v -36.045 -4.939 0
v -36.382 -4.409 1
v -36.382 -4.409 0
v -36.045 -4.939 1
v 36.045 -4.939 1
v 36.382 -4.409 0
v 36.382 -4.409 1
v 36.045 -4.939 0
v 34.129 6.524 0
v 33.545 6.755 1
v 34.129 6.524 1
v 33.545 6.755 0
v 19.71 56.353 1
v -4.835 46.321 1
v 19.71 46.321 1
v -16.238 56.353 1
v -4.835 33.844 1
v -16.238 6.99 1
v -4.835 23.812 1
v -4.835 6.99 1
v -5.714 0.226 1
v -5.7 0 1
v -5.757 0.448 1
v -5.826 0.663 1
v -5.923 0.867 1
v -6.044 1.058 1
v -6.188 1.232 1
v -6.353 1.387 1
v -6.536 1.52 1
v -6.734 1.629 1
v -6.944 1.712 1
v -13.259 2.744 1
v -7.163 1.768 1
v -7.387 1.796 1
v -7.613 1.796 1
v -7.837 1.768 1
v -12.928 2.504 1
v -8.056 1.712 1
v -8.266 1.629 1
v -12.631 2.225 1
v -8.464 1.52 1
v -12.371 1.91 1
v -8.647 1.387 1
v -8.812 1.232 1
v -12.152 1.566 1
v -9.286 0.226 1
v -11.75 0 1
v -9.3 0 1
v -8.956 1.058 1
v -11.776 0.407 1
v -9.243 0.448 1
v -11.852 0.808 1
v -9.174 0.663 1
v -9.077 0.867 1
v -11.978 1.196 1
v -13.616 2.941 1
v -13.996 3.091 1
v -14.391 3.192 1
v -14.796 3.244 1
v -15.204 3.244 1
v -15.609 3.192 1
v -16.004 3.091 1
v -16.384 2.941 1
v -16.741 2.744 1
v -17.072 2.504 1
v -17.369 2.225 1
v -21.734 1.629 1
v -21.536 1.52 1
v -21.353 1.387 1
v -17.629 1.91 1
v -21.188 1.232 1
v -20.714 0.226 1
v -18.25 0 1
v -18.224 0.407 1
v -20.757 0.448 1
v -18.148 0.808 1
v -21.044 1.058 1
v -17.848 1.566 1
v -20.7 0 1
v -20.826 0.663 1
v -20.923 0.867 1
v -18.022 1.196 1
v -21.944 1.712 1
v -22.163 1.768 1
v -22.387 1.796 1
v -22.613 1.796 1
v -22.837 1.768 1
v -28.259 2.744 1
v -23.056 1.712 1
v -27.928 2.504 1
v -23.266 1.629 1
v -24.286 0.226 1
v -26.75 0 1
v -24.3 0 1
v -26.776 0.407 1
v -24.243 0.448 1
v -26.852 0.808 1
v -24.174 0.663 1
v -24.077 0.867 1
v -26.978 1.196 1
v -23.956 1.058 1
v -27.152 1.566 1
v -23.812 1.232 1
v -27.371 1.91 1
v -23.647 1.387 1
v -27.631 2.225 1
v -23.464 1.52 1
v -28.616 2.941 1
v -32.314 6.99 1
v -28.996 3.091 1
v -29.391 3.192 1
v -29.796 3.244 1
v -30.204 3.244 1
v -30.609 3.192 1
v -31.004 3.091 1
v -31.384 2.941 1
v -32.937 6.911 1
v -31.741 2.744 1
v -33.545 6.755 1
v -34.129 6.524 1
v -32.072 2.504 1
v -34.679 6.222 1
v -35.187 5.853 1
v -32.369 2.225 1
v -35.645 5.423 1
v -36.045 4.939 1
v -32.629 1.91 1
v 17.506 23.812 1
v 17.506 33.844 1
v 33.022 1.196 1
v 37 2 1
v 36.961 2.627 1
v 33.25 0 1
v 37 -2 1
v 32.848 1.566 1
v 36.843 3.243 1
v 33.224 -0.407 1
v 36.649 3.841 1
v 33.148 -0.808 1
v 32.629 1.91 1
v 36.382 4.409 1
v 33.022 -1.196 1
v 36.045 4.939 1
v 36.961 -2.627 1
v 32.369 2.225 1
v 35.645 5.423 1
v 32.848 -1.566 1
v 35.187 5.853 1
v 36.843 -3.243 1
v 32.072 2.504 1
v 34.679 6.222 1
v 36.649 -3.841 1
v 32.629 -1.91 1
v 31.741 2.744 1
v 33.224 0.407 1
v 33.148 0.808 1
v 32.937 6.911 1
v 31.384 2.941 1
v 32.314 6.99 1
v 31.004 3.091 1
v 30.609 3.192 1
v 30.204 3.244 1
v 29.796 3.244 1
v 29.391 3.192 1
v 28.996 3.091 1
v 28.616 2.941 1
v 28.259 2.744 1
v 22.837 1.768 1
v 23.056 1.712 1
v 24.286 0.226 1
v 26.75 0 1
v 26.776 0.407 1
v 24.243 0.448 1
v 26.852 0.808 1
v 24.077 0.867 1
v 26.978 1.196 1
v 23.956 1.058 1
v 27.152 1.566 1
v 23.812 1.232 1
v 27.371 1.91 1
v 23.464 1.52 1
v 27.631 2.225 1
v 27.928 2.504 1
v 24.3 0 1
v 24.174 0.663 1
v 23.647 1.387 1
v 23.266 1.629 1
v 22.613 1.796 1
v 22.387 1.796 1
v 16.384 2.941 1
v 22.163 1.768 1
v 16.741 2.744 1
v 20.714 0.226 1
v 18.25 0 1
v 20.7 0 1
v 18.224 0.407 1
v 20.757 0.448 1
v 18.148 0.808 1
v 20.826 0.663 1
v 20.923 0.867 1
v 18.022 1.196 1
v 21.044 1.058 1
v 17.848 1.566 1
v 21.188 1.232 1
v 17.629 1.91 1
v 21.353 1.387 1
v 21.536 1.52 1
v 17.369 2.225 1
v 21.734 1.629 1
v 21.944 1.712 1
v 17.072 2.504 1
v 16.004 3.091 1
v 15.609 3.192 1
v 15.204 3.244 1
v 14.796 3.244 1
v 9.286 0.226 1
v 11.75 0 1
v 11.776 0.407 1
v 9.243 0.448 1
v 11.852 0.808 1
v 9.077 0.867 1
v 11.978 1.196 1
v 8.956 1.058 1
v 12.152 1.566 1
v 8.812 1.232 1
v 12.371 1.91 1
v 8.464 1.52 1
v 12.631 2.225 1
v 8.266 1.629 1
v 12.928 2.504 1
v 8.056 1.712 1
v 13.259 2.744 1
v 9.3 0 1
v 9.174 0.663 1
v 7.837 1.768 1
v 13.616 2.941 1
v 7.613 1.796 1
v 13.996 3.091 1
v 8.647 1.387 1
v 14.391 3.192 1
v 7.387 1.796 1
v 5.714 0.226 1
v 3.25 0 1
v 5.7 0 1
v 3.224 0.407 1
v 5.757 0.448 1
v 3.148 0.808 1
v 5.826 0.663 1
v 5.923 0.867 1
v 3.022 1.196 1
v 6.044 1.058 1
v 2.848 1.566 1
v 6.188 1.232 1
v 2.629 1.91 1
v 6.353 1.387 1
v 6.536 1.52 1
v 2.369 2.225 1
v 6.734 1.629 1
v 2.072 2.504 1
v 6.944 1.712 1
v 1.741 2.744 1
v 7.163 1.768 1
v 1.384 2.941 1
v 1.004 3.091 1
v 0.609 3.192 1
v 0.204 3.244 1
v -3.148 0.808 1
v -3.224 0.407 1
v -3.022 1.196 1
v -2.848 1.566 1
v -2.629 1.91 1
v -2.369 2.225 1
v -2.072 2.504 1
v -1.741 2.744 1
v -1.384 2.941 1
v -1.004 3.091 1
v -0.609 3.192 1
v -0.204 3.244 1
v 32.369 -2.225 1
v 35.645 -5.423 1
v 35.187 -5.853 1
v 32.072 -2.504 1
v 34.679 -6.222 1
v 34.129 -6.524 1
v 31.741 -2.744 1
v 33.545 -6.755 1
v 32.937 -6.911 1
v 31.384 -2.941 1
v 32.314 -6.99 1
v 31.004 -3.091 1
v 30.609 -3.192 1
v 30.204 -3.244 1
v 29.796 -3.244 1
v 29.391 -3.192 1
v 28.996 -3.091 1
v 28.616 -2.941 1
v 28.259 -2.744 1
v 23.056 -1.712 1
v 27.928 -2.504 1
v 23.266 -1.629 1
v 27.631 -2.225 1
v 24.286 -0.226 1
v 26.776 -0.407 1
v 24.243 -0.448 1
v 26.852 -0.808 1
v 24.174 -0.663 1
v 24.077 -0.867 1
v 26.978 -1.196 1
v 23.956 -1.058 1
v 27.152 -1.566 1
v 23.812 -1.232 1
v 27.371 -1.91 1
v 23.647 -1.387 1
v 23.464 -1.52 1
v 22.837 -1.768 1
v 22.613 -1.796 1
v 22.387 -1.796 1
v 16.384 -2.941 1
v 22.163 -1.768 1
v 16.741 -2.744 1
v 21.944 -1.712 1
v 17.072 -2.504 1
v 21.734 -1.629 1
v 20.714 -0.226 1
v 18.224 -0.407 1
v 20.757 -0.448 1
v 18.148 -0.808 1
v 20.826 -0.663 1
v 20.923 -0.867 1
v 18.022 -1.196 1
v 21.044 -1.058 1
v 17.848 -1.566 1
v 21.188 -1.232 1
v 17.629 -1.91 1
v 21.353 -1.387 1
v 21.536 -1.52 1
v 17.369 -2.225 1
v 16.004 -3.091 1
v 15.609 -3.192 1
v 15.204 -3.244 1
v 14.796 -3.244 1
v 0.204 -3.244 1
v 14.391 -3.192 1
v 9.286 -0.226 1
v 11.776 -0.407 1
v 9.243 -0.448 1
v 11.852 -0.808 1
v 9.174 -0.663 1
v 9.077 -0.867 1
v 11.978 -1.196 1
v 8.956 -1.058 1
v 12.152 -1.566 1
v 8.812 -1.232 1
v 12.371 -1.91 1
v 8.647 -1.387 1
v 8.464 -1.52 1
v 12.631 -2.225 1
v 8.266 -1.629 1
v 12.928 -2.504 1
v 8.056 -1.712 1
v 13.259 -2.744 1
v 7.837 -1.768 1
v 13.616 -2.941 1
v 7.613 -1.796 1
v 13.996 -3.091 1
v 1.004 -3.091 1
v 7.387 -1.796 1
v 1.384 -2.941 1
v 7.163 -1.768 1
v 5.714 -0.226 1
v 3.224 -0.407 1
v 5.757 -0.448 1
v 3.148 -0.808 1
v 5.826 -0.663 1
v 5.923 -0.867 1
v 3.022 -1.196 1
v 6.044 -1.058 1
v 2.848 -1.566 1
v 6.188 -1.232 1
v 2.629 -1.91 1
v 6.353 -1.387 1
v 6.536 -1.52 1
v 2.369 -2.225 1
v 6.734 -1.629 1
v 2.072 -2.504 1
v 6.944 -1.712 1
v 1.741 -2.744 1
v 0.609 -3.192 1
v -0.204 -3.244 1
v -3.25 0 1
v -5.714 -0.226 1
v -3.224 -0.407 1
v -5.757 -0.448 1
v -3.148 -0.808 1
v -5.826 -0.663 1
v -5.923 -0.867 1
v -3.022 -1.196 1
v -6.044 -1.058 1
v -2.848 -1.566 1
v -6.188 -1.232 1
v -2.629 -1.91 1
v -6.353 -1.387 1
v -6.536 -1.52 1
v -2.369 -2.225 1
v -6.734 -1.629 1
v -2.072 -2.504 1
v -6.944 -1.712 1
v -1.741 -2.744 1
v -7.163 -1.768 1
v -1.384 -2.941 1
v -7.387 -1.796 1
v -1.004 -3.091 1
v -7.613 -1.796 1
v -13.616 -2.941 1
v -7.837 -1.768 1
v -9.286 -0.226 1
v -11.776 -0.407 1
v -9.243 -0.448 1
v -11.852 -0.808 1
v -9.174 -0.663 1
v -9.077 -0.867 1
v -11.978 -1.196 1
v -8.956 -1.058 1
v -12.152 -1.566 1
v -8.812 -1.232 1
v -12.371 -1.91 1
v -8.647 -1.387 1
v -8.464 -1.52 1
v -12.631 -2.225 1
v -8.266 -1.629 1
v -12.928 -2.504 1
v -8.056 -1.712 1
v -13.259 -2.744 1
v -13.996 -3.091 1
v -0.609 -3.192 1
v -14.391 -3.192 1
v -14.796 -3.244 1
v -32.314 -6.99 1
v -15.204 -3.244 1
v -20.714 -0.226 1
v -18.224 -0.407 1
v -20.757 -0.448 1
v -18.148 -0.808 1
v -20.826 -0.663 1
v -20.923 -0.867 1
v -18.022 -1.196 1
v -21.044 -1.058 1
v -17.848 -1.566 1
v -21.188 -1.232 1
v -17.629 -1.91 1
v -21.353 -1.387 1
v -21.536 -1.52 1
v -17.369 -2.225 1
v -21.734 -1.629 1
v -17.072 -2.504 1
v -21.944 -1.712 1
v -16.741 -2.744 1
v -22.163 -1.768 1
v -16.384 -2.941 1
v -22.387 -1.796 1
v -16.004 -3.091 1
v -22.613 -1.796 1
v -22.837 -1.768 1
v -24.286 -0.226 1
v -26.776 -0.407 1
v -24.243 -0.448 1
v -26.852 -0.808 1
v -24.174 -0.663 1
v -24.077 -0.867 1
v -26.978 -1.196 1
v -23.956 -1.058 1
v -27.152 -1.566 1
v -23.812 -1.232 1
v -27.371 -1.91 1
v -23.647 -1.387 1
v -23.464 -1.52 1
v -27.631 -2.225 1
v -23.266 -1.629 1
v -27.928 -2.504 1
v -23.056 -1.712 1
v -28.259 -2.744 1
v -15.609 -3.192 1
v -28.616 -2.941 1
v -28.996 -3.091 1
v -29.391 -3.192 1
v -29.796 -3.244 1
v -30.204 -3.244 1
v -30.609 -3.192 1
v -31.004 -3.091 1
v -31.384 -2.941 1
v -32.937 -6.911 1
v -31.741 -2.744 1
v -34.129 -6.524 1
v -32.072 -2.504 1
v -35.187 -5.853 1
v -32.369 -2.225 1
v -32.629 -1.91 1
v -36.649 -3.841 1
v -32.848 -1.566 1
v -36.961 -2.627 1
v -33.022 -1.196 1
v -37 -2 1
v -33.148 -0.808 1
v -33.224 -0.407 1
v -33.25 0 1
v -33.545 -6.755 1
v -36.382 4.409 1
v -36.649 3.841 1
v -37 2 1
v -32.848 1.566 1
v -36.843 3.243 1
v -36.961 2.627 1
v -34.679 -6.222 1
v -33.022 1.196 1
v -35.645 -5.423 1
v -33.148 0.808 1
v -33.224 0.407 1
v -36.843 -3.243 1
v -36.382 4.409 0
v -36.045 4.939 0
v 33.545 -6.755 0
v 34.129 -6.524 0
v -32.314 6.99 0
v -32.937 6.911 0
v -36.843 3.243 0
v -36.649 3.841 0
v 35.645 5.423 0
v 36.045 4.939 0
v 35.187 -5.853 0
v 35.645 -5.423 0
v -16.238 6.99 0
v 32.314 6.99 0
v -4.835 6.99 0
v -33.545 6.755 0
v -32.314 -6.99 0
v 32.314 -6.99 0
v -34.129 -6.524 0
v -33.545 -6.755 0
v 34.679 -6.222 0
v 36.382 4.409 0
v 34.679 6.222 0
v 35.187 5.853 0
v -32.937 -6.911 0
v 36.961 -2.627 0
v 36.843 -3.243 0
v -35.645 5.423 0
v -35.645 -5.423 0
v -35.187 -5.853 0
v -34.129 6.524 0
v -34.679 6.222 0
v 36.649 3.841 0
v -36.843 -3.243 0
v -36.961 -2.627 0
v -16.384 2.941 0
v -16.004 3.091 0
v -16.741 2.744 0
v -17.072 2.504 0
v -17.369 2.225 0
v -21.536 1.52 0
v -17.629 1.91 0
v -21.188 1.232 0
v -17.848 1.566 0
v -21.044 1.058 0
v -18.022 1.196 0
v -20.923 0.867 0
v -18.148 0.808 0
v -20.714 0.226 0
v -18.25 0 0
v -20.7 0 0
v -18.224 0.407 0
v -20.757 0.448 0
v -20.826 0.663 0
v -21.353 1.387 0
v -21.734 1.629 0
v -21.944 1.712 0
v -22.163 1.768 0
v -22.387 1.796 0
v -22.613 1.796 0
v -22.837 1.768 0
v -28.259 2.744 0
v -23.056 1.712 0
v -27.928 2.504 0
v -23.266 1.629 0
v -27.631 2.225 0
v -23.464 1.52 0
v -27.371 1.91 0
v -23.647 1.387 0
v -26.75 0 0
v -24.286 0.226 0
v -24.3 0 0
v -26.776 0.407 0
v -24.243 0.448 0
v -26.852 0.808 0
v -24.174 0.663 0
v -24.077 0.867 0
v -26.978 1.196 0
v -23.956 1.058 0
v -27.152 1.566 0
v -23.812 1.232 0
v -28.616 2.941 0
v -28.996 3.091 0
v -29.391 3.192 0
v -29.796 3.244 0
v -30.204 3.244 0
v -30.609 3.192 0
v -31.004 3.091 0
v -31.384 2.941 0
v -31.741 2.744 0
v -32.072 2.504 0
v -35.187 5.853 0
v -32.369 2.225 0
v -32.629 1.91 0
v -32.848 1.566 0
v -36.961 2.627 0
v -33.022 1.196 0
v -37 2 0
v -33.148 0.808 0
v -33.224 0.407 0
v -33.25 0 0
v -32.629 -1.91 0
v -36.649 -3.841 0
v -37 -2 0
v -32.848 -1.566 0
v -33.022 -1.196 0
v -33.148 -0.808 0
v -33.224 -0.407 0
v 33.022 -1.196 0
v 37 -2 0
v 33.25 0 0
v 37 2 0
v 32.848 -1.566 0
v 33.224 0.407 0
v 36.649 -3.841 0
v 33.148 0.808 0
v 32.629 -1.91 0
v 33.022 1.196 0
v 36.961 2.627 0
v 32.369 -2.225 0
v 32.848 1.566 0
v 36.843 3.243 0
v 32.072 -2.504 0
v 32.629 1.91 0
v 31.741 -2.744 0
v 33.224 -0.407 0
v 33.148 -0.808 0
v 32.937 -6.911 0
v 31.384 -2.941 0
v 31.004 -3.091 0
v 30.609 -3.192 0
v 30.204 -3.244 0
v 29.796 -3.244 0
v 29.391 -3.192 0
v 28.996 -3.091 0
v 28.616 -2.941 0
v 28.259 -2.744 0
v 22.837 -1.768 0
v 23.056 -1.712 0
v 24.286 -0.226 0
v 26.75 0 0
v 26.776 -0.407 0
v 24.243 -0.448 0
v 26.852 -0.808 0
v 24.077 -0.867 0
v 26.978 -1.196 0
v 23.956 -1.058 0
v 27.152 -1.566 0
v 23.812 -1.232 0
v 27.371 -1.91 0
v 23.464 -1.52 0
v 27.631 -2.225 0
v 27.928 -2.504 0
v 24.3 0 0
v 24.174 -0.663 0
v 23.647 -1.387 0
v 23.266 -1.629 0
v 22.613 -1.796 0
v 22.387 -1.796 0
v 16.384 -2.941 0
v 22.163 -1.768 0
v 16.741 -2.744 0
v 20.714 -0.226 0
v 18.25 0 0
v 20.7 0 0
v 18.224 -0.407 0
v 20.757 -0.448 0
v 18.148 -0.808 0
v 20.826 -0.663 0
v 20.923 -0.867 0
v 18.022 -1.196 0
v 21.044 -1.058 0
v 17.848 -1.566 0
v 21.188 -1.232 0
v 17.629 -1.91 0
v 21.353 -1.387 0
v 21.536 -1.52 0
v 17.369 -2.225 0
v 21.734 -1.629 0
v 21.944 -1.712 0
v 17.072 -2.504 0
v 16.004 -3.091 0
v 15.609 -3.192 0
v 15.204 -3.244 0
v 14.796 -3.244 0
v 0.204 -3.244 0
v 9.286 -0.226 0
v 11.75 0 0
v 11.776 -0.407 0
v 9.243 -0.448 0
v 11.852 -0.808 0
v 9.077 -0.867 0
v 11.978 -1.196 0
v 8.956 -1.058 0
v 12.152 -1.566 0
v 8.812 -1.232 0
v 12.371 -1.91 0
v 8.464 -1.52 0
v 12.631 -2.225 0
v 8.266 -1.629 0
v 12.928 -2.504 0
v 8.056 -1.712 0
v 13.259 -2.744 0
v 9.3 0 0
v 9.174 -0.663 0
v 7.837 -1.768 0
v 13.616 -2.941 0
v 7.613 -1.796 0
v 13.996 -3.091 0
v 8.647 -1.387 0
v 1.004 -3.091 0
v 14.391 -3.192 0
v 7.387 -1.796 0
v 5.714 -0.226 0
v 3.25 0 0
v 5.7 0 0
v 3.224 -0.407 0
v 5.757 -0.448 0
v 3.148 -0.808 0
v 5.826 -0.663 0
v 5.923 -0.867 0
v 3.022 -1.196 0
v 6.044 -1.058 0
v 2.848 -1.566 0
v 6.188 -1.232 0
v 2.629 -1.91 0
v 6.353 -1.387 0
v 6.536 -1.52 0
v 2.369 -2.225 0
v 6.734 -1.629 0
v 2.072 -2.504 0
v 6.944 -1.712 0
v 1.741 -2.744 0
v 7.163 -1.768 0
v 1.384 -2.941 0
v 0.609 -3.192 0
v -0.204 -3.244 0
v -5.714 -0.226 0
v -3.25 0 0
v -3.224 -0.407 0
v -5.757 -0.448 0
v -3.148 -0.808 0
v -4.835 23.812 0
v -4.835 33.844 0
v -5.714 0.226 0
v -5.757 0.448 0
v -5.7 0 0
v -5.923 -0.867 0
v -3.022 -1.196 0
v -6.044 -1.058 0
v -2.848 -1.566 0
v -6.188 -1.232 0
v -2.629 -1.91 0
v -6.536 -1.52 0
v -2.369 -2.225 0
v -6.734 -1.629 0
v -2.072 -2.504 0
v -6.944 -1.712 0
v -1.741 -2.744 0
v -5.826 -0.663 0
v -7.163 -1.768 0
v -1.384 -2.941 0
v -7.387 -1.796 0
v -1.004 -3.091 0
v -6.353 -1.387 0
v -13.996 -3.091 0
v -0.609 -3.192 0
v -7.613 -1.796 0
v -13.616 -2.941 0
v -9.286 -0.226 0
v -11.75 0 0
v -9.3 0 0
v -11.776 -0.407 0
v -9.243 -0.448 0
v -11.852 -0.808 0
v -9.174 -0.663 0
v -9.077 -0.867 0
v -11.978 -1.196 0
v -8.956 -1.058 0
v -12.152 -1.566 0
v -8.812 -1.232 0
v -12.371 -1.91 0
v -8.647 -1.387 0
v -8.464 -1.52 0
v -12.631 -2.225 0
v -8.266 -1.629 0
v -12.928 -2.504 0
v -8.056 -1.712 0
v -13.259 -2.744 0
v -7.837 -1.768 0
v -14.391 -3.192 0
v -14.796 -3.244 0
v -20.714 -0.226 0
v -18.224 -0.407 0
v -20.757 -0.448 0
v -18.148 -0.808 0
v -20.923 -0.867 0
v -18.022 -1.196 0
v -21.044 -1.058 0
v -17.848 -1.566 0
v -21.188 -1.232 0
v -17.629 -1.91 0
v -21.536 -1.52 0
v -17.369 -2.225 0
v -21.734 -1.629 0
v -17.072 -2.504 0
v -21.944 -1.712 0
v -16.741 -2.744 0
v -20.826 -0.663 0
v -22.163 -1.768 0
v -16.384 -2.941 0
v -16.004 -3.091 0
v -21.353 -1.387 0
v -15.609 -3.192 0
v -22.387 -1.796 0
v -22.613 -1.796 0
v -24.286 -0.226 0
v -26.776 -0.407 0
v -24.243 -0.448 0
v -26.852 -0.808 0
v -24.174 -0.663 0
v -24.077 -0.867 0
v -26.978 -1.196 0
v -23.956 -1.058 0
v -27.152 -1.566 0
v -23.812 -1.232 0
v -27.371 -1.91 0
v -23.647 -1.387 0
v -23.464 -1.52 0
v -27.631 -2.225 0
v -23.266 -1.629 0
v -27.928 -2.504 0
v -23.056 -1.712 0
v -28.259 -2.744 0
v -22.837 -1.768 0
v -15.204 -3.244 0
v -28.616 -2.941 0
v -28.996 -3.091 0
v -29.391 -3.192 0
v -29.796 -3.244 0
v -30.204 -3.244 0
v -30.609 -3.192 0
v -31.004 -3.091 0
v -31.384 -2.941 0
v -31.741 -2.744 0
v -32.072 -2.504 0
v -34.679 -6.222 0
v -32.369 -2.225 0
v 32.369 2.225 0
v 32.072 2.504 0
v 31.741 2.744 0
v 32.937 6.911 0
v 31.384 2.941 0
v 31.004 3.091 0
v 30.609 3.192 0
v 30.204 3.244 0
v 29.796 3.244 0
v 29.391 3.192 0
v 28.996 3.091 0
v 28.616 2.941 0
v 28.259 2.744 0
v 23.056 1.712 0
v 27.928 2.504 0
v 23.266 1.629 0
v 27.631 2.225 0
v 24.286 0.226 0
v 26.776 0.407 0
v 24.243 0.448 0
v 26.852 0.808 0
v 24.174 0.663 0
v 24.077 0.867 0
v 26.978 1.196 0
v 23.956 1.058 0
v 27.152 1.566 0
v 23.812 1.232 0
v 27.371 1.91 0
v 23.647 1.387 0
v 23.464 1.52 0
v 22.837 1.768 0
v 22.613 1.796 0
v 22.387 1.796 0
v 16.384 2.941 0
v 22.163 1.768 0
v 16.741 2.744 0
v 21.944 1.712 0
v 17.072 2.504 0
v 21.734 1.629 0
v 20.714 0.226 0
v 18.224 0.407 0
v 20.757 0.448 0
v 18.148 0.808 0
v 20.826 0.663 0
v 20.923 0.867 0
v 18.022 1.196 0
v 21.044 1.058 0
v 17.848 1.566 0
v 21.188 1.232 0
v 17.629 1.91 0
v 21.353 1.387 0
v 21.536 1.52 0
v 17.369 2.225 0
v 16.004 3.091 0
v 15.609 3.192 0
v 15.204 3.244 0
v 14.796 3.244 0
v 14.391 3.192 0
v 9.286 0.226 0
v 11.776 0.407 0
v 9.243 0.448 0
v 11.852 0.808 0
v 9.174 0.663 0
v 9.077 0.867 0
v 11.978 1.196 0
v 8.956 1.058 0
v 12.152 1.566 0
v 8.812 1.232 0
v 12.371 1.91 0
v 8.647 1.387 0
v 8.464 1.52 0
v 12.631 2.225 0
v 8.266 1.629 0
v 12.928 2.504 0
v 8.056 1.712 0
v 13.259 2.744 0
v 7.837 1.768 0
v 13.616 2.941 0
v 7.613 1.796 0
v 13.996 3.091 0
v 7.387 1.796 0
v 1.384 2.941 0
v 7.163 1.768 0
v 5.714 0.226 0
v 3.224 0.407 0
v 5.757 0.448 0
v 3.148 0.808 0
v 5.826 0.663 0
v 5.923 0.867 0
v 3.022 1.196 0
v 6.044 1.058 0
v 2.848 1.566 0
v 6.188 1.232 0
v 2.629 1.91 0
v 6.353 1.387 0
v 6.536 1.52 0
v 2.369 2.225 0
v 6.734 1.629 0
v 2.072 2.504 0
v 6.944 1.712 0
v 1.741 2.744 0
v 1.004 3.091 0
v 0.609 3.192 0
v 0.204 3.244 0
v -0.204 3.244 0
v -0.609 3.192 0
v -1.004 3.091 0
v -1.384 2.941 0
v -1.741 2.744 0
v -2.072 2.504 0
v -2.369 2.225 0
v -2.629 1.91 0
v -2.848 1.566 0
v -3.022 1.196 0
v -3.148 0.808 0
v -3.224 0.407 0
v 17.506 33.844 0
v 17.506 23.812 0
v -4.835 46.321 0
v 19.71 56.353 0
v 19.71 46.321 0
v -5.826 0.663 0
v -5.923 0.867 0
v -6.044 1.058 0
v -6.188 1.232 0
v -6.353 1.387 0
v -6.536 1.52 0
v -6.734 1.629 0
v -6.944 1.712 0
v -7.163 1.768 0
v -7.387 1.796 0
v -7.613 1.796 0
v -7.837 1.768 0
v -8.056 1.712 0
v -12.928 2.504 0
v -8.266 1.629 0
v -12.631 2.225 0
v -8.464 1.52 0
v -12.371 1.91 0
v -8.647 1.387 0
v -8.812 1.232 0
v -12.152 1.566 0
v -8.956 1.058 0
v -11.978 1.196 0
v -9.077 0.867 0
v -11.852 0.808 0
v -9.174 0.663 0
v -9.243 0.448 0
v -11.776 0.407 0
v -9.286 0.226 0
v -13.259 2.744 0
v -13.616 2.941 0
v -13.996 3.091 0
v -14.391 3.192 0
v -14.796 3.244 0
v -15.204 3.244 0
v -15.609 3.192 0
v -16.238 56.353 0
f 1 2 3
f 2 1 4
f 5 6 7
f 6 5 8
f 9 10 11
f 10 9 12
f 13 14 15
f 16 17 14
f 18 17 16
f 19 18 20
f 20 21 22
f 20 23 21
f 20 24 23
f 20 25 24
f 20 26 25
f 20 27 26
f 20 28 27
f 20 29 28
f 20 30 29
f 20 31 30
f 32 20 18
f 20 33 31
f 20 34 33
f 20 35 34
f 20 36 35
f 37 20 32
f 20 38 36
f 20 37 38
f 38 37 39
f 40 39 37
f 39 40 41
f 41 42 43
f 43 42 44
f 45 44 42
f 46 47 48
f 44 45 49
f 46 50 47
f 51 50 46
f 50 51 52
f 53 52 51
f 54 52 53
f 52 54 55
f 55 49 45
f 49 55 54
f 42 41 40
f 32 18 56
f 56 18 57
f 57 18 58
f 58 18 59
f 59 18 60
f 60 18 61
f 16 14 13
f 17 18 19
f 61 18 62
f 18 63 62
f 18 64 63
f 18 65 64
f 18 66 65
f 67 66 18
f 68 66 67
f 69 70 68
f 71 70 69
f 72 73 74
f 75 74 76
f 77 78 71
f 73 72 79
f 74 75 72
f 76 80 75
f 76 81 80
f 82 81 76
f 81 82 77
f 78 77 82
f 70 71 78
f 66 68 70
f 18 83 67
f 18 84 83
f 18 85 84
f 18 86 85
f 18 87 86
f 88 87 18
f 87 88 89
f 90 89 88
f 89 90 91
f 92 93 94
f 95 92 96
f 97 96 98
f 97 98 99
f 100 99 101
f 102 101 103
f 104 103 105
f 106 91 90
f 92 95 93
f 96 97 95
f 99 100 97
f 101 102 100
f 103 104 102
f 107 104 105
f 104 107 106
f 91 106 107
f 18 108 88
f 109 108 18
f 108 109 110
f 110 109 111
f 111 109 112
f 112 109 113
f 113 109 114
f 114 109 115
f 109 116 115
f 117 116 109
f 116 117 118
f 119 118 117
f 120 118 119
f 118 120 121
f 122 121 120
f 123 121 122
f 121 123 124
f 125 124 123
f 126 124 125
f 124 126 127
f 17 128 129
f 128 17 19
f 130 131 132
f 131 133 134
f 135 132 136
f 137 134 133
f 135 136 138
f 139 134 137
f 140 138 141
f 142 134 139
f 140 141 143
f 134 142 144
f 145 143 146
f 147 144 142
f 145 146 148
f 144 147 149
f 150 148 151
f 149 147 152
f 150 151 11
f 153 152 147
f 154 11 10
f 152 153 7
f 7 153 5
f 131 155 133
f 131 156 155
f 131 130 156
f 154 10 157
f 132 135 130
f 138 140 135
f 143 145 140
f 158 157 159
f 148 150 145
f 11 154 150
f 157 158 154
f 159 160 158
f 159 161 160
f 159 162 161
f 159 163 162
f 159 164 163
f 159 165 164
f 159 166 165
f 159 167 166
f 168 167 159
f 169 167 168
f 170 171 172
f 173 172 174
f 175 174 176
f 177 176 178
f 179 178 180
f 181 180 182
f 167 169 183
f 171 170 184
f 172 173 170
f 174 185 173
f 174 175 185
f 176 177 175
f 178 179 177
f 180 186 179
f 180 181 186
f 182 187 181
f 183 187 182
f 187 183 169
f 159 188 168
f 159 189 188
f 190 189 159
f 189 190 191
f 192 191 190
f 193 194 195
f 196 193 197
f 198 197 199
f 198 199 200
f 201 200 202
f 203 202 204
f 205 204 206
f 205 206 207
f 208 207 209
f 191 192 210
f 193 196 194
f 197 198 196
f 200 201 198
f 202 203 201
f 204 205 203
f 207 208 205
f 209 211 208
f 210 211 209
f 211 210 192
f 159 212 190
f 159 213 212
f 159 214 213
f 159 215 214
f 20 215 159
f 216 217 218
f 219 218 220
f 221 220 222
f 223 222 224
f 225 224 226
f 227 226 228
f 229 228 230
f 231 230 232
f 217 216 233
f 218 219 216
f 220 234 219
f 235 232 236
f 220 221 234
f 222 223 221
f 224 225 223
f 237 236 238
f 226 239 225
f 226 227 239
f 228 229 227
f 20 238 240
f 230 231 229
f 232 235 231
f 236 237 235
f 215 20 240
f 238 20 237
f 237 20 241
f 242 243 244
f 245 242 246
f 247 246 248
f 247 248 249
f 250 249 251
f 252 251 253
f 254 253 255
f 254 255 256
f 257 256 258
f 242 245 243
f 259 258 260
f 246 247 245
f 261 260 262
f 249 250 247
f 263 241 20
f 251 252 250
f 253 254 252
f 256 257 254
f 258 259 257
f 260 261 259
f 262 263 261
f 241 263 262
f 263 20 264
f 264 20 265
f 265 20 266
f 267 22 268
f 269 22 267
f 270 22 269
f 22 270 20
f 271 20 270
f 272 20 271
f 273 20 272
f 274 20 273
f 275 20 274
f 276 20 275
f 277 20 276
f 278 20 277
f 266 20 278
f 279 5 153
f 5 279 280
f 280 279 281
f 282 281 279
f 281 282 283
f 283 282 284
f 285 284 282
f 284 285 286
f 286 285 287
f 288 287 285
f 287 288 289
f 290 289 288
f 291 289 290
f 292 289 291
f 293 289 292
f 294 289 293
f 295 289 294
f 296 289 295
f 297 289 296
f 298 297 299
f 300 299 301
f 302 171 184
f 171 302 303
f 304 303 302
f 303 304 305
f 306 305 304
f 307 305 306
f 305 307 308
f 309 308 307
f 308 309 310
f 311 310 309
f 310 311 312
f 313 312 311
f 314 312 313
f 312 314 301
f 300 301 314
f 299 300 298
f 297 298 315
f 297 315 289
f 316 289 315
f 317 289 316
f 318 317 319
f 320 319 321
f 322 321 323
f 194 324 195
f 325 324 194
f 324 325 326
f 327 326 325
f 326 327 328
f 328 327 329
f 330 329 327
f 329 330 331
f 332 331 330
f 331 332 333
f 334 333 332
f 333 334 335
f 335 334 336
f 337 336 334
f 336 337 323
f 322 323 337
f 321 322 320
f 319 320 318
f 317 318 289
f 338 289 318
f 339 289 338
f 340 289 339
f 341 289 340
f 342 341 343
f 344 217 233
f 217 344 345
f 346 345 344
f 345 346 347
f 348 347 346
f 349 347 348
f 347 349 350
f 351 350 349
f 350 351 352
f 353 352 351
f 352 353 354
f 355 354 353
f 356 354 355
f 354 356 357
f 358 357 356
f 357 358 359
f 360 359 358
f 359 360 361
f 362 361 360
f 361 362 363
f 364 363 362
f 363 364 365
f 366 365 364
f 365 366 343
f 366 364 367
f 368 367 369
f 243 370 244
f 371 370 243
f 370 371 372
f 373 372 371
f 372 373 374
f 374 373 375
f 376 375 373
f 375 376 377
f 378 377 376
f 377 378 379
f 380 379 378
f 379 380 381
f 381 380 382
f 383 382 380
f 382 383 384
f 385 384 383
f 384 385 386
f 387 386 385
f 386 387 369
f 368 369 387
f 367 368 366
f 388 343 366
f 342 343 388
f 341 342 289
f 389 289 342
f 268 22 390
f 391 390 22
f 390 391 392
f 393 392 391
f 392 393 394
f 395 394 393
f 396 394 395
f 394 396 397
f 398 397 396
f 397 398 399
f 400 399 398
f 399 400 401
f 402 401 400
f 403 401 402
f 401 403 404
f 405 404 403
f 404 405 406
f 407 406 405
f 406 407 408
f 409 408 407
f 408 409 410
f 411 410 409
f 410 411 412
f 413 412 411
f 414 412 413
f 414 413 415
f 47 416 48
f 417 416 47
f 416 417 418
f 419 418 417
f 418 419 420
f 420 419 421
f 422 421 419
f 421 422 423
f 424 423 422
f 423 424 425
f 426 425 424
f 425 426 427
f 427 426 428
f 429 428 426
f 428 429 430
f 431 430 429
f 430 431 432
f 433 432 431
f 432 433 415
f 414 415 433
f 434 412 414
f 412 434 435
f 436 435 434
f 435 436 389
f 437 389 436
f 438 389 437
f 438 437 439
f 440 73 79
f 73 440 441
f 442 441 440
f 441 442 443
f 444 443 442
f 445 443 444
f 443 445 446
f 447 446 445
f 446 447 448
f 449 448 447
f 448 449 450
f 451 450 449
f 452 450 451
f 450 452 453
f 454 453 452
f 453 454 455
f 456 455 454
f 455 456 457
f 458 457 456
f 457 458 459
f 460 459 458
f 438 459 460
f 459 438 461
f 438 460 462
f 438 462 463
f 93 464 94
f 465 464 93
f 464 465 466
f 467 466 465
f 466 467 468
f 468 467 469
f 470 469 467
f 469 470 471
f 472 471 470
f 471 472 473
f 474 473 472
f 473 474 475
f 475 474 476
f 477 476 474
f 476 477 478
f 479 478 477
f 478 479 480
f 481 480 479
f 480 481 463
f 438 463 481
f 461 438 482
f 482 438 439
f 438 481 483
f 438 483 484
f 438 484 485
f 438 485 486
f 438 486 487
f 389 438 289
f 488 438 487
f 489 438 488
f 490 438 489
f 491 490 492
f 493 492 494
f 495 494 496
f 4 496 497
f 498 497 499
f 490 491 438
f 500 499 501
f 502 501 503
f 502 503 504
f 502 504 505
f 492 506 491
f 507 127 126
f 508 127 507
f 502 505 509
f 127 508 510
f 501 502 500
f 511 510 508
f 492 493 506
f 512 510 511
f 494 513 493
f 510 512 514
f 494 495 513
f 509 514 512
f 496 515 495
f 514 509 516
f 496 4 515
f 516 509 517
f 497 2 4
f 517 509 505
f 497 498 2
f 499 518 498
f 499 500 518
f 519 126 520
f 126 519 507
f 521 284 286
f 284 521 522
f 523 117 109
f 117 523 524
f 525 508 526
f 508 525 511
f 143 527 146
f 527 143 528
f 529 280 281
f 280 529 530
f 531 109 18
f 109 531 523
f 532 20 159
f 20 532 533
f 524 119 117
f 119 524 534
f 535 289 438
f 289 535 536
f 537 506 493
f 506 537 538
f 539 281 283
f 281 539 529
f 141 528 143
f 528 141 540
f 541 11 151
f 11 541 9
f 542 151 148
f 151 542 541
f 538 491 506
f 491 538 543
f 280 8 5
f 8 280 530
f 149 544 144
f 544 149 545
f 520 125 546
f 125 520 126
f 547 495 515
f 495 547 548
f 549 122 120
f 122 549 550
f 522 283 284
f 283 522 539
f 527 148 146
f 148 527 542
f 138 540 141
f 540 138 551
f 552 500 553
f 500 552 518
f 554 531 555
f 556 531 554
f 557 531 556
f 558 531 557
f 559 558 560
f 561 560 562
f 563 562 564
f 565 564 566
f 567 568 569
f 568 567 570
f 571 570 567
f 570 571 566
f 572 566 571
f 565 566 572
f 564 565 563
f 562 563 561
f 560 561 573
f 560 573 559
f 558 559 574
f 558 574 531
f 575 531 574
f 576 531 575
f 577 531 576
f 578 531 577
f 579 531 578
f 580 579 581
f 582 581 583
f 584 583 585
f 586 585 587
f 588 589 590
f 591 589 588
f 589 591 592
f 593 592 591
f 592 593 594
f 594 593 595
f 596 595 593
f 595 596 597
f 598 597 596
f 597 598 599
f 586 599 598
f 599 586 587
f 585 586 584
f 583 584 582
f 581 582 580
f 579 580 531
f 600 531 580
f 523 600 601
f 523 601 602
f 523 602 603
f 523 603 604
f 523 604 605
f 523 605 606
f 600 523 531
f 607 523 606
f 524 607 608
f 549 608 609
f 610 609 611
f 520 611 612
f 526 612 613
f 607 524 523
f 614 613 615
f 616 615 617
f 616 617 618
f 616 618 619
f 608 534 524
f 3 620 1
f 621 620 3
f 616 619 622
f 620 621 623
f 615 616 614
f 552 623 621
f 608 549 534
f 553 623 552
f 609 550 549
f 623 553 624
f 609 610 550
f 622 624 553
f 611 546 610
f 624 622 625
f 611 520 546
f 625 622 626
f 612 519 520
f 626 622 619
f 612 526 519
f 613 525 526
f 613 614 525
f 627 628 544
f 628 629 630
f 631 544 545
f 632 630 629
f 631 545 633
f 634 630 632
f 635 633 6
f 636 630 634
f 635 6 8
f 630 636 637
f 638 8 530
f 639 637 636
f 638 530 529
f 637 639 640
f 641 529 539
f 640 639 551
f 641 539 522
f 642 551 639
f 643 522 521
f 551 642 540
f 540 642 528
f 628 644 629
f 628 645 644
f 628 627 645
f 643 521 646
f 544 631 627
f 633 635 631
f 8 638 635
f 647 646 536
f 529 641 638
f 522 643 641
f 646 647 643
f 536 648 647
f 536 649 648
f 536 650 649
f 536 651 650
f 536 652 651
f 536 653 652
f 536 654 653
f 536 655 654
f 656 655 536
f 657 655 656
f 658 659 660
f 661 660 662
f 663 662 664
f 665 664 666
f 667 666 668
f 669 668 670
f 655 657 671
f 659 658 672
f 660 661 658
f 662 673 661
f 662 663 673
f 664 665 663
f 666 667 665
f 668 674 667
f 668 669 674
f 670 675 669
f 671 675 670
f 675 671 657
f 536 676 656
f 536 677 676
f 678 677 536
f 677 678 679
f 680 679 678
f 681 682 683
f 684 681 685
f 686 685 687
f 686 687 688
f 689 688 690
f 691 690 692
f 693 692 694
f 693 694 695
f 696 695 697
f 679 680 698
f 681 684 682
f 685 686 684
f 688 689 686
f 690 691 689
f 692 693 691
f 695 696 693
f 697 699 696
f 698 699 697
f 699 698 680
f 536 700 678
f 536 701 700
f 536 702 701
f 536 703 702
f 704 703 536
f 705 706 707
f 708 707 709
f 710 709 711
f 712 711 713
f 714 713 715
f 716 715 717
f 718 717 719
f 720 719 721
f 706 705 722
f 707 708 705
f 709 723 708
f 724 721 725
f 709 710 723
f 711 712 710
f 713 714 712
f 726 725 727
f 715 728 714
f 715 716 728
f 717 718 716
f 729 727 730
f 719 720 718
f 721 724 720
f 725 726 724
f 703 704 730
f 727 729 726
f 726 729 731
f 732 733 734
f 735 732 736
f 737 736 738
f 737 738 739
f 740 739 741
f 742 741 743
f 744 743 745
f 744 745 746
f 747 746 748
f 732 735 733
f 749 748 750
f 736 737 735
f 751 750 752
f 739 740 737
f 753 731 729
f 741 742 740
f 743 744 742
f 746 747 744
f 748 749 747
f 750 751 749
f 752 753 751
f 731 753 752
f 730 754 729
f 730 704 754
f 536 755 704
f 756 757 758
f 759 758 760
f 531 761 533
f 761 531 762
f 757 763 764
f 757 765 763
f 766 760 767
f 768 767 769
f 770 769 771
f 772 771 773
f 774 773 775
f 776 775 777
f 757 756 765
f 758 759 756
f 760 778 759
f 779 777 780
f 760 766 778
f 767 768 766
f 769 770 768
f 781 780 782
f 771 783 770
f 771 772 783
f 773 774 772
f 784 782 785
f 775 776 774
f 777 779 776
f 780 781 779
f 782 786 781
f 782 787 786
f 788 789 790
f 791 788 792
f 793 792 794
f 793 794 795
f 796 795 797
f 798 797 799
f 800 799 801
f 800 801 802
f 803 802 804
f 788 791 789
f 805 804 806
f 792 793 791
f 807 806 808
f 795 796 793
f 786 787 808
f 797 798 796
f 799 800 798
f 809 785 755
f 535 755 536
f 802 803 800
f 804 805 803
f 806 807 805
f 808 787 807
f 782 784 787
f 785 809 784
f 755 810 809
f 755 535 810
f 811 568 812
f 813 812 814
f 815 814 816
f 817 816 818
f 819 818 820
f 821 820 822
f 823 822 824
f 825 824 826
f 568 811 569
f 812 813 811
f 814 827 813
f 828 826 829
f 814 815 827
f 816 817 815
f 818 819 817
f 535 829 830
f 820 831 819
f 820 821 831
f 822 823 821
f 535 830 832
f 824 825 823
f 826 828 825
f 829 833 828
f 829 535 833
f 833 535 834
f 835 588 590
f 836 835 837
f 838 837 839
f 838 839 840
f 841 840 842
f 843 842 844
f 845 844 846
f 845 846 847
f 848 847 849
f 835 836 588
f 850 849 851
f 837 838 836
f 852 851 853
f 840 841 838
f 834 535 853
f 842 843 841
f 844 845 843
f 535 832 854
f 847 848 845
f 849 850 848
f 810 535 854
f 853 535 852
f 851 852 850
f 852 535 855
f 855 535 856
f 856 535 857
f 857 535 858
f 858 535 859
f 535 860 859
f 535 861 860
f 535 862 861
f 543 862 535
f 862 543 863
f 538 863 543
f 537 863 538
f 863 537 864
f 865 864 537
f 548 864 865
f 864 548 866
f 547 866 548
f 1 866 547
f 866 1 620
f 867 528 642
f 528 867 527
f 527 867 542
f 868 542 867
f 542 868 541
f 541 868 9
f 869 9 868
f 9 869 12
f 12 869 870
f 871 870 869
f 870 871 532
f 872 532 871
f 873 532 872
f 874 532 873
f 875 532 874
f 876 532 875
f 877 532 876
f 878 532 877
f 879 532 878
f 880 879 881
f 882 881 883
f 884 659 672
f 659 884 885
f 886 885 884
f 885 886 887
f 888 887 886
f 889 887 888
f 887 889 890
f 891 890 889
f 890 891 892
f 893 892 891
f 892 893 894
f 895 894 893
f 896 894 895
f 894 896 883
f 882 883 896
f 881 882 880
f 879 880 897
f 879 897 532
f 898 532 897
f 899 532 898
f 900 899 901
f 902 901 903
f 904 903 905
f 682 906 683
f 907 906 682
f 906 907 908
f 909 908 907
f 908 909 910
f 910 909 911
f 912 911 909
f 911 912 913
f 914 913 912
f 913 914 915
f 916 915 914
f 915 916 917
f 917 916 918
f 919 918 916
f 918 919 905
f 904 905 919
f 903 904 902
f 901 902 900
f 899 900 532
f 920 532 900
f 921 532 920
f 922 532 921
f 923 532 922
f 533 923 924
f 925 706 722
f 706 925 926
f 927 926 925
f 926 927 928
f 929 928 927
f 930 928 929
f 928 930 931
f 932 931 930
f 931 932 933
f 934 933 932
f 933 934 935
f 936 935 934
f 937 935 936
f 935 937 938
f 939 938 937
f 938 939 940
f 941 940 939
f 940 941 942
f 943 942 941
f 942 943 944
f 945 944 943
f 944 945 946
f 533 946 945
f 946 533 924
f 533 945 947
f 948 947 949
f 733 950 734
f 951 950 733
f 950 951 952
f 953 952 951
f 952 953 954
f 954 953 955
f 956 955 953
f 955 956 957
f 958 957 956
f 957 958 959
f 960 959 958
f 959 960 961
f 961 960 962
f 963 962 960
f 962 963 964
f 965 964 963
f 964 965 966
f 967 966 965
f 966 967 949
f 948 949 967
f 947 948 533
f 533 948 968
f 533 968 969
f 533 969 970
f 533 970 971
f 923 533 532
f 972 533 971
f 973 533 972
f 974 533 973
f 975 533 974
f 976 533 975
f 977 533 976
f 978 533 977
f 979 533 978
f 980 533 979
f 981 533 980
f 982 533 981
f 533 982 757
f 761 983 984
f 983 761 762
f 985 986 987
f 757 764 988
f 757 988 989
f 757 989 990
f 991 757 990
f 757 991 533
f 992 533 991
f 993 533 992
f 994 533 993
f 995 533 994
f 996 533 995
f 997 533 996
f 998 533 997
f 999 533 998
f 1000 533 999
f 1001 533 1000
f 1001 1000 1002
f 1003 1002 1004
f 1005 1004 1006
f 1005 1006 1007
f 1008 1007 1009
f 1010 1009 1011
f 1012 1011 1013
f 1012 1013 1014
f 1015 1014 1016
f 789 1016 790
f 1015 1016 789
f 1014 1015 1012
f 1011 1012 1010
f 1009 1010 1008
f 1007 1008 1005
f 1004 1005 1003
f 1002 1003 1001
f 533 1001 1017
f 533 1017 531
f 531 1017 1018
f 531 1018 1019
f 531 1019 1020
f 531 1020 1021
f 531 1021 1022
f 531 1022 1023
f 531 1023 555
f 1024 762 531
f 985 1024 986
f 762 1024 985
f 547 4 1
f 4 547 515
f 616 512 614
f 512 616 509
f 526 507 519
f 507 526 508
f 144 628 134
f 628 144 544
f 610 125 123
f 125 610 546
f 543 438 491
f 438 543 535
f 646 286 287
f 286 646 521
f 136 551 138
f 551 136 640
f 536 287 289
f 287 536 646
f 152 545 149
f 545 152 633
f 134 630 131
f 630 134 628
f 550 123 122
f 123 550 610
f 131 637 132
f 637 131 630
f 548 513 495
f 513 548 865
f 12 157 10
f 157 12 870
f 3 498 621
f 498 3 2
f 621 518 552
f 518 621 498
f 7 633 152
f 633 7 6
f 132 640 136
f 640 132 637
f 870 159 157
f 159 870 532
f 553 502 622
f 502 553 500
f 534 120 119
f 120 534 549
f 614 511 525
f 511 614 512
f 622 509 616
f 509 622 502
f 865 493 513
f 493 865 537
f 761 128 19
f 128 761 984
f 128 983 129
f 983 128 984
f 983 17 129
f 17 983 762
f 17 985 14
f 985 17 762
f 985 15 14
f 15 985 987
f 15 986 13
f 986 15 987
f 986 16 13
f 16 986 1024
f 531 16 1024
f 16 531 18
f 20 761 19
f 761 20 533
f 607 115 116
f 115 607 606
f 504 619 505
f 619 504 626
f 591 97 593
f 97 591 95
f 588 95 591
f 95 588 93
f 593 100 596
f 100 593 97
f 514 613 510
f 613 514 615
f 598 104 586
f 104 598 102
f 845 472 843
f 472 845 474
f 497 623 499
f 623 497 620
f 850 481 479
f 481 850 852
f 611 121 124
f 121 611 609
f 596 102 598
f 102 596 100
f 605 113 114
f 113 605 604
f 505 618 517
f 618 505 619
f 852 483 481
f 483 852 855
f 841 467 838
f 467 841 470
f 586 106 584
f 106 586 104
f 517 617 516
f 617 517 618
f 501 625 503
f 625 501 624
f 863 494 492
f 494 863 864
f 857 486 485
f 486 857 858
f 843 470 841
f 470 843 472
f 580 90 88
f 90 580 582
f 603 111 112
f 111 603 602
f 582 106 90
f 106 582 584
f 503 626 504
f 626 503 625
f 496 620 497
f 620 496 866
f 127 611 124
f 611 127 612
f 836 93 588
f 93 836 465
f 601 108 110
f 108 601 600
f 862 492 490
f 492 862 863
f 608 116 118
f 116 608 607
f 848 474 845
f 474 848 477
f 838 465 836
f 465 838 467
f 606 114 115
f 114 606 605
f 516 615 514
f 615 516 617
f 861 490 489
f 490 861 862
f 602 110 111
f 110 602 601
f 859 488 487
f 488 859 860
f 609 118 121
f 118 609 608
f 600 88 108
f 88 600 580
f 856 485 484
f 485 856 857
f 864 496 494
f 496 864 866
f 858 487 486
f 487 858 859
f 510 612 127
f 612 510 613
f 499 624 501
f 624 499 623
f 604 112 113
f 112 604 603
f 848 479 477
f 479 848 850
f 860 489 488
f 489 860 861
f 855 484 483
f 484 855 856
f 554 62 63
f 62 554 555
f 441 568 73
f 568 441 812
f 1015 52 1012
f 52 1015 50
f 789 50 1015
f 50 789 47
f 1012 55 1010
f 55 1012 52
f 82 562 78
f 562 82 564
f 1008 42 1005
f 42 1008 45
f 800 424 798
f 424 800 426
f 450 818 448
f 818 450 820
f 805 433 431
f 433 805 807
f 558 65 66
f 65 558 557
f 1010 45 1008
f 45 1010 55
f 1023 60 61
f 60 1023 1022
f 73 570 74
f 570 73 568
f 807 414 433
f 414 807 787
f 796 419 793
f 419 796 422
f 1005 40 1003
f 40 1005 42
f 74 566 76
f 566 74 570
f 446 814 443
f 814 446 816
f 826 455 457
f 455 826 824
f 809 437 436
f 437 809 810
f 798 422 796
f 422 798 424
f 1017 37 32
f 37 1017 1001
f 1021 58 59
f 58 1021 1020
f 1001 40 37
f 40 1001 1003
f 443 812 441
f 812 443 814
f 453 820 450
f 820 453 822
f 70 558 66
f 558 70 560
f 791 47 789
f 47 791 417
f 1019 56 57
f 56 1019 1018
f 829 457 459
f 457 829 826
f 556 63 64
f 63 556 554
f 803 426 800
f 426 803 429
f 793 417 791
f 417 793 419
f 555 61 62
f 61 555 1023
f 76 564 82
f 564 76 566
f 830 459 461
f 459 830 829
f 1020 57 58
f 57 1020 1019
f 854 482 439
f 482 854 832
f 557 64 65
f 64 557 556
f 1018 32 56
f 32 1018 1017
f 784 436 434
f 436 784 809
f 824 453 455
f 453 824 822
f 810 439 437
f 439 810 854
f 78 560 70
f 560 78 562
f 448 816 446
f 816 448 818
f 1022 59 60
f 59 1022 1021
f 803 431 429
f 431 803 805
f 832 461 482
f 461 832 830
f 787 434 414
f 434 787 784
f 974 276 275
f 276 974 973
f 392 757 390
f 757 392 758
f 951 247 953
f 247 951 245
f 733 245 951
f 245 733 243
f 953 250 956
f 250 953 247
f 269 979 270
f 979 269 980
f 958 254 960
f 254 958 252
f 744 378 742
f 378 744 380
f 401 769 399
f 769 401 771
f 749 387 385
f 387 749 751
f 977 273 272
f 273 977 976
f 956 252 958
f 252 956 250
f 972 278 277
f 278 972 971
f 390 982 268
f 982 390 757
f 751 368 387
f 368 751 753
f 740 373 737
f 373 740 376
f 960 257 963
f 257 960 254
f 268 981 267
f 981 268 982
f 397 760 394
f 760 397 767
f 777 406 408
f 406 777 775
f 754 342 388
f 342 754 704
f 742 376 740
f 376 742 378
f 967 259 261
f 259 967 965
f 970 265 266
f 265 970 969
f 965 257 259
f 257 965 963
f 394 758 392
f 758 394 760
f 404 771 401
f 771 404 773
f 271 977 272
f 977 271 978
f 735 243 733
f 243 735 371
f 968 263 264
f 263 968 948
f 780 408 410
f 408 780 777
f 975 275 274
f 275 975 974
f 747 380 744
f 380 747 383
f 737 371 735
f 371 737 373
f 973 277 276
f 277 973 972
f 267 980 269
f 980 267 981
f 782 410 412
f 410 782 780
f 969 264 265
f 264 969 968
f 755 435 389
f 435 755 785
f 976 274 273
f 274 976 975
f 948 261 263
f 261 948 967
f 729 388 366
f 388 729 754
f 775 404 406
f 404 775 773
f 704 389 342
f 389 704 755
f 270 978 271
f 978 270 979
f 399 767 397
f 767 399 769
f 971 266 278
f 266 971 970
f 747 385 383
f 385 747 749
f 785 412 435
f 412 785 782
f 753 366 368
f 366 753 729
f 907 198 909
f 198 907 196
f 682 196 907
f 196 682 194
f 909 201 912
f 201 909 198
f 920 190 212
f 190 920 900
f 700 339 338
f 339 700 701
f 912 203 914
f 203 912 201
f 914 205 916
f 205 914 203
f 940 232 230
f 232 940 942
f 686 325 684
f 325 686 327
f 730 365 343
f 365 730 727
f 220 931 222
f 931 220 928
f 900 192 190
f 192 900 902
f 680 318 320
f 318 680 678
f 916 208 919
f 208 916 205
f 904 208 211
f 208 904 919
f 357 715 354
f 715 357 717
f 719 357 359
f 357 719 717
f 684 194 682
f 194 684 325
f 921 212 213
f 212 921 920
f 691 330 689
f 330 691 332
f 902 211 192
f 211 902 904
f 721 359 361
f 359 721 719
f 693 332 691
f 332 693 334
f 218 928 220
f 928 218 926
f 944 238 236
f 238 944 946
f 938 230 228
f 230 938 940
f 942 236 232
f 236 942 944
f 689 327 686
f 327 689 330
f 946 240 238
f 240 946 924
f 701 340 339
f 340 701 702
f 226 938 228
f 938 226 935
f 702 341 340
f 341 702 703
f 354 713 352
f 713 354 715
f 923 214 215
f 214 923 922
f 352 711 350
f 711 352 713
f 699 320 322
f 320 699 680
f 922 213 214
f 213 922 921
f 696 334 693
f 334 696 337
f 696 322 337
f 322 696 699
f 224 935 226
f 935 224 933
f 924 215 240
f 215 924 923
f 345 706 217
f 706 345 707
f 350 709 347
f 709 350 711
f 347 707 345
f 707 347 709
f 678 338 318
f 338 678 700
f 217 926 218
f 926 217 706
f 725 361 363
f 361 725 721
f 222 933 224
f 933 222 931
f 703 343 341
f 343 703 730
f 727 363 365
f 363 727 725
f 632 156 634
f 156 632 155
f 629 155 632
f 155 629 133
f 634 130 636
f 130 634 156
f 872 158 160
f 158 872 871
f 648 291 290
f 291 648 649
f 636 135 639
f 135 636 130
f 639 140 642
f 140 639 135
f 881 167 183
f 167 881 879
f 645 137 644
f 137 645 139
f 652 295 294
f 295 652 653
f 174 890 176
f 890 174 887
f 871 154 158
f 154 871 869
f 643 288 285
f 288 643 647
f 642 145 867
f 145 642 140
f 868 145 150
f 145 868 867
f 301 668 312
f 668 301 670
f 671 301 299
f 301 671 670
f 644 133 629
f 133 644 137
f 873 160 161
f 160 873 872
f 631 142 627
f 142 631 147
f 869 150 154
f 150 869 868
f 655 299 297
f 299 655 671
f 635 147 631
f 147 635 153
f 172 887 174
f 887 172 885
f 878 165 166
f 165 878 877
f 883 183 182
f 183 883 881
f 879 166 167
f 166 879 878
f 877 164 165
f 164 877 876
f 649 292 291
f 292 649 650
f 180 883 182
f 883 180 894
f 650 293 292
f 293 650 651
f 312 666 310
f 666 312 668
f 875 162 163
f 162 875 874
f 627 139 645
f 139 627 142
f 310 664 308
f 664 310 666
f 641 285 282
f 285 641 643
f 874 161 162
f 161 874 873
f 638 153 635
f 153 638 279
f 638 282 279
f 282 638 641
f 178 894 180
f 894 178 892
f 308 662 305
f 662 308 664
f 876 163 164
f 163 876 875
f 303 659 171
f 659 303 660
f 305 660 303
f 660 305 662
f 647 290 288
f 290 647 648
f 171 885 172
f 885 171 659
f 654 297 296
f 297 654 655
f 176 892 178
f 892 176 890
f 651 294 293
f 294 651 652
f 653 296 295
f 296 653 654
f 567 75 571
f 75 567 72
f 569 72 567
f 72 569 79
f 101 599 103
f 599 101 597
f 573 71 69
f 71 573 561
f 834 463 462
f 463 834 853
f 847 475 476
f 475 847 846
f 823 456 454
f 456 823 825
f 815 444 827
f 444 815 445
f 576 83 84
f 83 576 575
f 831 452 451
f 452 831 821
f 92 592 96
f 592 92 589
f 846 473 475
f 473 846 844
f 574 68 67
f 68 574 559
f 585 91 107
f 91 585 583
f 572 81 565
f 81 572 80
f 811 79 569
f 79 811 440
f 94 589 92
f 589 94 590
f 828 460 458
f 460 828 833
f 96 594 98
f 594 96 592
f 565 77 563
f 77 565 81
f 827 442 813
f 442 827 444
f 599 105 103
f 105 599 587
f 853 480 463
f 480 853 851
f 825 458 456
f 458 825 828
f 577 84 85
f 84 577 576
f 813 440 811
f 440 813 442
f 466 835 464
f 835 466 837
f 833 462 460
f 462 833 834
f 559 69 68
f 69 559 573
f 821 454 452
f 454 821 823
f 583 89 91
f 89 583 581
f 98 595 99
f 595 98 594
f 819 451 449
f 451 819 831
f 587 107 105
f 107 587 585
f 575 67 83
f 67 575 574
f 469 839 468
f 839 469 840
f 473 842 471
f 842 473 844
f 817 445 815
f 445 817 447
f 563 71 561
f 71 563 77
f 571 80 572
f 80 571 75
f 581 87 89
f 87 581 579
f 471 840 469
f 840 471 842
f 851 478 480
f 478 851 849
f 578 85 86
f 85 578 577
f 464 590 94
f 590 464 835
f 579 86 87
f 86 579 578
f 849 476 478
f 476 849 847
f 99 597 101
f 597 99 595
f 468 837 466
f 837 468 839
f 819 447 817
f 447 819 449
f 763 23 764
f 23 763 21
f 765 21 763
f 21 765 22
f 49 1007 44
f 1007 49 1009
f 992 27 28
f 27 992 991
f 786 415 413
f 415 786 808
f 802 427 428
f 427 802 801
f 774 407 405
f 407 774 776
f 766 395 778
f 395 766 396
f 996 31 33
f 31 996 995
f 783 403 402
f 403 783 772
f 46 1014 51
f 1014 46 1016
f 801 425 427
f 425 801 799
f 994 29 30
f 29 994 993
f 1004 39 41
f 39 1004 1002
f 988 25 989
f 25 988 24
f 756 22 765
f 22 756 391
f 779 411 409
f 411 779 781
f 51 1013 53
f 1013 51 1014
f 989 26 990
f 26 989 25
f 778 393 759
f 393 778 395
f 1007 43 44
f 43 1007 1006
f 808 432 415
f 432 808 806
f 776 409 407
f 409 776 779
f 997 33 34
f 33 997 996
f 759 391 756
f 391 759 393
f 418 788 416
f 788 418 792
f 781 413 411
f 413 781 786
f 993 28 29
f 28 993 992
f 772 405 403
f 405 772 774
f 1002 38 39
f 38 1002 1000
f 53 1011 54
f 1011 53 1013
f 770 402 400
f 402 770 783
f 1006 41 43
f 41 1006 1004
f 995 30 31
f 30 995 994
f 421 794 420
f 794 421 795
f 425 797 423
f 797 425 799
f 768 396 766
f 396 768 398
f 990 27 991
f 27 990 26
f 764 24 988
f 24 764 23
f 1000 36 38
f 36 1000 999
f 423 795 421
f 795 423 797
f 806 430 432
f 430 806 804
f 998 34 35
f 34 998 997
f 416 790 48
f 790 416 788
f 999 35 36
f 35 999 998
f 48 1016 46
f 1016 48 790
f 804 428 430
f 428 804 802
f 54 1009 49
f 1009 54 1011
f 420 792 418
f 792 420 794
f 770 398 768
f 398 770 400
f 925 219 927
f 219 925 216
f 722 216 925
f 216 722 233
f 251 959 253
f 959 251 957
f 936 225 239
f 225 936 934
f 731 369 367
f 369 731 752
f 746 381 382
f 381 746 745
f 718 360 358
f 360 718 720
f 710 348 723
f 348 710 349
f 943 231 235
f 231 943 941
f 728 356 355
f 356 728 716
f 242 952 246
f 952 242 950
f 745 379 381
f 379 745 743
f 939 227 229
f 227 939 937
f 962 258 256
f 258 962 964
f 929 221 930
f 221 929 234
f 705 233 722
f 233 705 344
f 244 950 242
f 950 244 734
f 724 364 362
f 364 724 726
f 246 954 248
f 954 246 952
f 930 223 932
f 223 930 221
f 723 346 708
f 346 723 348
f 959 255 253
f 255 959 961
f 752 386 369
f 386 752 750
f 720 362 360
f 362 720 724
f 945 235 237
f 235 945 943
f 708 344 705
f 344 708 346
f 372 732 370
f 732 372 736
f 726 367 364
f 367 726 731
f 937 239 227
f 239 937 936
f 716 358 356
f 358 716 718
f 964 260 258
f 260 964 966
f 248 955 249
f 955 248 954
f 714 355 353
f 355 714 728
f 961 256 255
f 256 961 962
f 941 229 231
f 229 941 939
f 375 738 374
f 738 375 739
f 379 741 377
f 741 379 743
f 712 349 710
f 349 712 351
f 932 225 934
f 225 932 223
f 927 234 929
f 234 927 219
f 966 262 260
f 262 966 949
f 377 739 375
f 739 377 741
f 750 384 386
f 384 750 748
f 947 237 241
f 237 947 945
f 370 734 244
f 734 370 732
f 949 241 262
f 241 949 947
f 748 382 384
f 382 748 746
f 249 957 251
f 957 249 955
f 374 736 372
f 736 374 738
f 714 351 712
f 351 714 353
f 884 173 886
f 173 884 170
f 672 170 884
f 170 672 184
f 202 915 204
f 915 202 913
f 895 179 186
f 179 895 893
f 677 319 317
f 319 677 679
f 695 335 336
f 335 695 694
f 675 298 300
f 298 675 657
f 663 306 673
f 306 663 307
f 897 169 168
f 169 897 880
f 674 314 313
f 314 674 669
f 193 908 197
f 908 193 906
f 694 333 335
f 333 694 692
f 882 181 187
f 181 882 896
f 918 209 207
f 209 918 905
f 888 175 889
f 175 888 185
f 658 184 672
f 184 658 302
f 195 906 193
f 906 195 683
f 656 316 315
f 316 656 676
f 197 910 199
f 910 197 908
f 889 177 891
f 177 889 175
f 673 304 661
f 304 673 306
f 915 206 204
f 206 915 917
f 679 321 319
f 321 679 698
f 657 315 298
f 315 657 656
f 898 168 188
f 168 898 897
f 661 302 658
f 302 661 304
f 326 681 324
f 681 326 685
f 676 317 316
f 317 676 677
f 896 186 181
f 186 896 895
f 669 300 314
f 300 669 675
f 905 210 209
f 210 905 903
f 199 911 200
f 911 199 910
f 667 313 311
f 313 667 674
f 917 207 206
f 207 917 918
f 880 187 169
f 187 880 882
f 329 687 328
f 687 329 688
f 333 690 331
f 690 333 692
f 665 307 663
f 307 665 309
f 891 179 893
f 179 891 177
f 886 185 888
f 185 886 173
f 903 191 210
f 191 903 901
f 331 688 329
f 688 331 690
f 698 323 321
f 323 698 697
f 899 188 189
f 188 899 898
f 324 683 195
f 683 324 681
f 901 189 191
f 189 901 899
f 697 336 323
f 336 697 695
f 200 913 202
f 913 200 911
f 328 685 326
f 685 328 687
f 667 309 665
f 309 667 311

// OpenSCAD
$fn = 50;


difference() {
	union() {
		hull() {
			translate(v = [-32.0000000000, 2.0000000000, 0]) {
				cylinder(h = 1, r = 5);
			}
			translate(v = [32.0000000000, 2.0000000000, 0]) {
				cylinder(h = 1, r = 5);
			}
			translate(v = [-32.0000000000, -2.0000000000, 0]) {
				cylinder(h = 1, r = 5);
			}
			translate(v = [32.0000000000, -2.0000000000, 0]) {
				cylinder(h = 1, r = 5);
			}
		}
		translate(v = [0, 55, 0]) {
			linear_extrude(height = 1) {
				text(font = "DejaVu Sans Mono:style=Bold", halign = "center", size = 57.0000000000, text = "F", valign = "top");
			}
		}
	}
	union() {
		translate(v = [-30.0000000000, 0.0000000000, 0]) {
			translate(v = [0, 0, -100]) {
				cylinder(h = 200, r = 3.2500000000);
			}
		}
		translate(v = [-15.0000000000, 0.0000000000, 0]) {
			translate(v = [0, 0, -100]) {
				cylinder(h = 200, r = 3.2500000000);
			}
		}
		translate(v = [0, 0, -100]) {
			cylinder(h = 200, r = 3.2500000000);
		}
		translate(v = [15.0000000000, 0.0000000000, 0]) {
			translate(v = [0, 0, -100]) {
				cylinder(h = 200, r = 3.2500000000);
			}
		}
		translate(v = [30.0000000000, 0.0000000000, 0]) {
			translate(v = [0, 0, -100]) {
				cylinder(h = 200, r = 3.2500000000);
			}
		}
		translate(v = [-30.0000000000, 0.0000000000, 0]) {
			translate(v = [0, 0, -100]) {
				cylinder(h = 200, r = 1.8000000000);
			}
		}
		translate(v = [-22.5000000000, 0.0000000000, 0]) {
			translate(v = [0, 0, -100]) {
				cylinder(h = 200, r = 1.8000000000);
			}
		}
		translate(v = [-15.0000000000, 0.0000000000, 0]) {
			translate(v = [0, 0, -100]) {
				cylinder(h = 200, r = 1.8000000000);
			}
		}
		translate(v = [-7.5000000000, 0.0000000000, 0]) {
			translate(v = [0, 0, -100]) {
				cylinder(h = 200, r = 1.8000000000);
			}
		}
		translate(v = [0, 0, -100]) {
			cylinder(h = 200, r = 1.8000000000);
		}
		translate(v = [7.5000000000, 0.0000000000, 0]) {
			translate(v = [0, 0, -100]) {
				cylinder(h = 200, r = 1.8000000000);
			}
		}
		translate(v = [15.0000000000, 0.0000000000, 0]) {
			translate(v = [0, 0, -100]) {
				cylinder(h = 200, r = 1.8000000000);
			}
		}
		translate(v = [22.5000000000, 0.0000000000, 0]) {
			translate(v = [0, 0, -100]) {
				cylinder(h = 200, r = 1.8000000000);
			}
		}
		translate(v = [30.0000000000, 0.0000000000, 0]) {
			translate(v = [0, 0, -100]) {
				cylinder(h = 200, r = 1.8000000000);
			}
		}
	}
}
